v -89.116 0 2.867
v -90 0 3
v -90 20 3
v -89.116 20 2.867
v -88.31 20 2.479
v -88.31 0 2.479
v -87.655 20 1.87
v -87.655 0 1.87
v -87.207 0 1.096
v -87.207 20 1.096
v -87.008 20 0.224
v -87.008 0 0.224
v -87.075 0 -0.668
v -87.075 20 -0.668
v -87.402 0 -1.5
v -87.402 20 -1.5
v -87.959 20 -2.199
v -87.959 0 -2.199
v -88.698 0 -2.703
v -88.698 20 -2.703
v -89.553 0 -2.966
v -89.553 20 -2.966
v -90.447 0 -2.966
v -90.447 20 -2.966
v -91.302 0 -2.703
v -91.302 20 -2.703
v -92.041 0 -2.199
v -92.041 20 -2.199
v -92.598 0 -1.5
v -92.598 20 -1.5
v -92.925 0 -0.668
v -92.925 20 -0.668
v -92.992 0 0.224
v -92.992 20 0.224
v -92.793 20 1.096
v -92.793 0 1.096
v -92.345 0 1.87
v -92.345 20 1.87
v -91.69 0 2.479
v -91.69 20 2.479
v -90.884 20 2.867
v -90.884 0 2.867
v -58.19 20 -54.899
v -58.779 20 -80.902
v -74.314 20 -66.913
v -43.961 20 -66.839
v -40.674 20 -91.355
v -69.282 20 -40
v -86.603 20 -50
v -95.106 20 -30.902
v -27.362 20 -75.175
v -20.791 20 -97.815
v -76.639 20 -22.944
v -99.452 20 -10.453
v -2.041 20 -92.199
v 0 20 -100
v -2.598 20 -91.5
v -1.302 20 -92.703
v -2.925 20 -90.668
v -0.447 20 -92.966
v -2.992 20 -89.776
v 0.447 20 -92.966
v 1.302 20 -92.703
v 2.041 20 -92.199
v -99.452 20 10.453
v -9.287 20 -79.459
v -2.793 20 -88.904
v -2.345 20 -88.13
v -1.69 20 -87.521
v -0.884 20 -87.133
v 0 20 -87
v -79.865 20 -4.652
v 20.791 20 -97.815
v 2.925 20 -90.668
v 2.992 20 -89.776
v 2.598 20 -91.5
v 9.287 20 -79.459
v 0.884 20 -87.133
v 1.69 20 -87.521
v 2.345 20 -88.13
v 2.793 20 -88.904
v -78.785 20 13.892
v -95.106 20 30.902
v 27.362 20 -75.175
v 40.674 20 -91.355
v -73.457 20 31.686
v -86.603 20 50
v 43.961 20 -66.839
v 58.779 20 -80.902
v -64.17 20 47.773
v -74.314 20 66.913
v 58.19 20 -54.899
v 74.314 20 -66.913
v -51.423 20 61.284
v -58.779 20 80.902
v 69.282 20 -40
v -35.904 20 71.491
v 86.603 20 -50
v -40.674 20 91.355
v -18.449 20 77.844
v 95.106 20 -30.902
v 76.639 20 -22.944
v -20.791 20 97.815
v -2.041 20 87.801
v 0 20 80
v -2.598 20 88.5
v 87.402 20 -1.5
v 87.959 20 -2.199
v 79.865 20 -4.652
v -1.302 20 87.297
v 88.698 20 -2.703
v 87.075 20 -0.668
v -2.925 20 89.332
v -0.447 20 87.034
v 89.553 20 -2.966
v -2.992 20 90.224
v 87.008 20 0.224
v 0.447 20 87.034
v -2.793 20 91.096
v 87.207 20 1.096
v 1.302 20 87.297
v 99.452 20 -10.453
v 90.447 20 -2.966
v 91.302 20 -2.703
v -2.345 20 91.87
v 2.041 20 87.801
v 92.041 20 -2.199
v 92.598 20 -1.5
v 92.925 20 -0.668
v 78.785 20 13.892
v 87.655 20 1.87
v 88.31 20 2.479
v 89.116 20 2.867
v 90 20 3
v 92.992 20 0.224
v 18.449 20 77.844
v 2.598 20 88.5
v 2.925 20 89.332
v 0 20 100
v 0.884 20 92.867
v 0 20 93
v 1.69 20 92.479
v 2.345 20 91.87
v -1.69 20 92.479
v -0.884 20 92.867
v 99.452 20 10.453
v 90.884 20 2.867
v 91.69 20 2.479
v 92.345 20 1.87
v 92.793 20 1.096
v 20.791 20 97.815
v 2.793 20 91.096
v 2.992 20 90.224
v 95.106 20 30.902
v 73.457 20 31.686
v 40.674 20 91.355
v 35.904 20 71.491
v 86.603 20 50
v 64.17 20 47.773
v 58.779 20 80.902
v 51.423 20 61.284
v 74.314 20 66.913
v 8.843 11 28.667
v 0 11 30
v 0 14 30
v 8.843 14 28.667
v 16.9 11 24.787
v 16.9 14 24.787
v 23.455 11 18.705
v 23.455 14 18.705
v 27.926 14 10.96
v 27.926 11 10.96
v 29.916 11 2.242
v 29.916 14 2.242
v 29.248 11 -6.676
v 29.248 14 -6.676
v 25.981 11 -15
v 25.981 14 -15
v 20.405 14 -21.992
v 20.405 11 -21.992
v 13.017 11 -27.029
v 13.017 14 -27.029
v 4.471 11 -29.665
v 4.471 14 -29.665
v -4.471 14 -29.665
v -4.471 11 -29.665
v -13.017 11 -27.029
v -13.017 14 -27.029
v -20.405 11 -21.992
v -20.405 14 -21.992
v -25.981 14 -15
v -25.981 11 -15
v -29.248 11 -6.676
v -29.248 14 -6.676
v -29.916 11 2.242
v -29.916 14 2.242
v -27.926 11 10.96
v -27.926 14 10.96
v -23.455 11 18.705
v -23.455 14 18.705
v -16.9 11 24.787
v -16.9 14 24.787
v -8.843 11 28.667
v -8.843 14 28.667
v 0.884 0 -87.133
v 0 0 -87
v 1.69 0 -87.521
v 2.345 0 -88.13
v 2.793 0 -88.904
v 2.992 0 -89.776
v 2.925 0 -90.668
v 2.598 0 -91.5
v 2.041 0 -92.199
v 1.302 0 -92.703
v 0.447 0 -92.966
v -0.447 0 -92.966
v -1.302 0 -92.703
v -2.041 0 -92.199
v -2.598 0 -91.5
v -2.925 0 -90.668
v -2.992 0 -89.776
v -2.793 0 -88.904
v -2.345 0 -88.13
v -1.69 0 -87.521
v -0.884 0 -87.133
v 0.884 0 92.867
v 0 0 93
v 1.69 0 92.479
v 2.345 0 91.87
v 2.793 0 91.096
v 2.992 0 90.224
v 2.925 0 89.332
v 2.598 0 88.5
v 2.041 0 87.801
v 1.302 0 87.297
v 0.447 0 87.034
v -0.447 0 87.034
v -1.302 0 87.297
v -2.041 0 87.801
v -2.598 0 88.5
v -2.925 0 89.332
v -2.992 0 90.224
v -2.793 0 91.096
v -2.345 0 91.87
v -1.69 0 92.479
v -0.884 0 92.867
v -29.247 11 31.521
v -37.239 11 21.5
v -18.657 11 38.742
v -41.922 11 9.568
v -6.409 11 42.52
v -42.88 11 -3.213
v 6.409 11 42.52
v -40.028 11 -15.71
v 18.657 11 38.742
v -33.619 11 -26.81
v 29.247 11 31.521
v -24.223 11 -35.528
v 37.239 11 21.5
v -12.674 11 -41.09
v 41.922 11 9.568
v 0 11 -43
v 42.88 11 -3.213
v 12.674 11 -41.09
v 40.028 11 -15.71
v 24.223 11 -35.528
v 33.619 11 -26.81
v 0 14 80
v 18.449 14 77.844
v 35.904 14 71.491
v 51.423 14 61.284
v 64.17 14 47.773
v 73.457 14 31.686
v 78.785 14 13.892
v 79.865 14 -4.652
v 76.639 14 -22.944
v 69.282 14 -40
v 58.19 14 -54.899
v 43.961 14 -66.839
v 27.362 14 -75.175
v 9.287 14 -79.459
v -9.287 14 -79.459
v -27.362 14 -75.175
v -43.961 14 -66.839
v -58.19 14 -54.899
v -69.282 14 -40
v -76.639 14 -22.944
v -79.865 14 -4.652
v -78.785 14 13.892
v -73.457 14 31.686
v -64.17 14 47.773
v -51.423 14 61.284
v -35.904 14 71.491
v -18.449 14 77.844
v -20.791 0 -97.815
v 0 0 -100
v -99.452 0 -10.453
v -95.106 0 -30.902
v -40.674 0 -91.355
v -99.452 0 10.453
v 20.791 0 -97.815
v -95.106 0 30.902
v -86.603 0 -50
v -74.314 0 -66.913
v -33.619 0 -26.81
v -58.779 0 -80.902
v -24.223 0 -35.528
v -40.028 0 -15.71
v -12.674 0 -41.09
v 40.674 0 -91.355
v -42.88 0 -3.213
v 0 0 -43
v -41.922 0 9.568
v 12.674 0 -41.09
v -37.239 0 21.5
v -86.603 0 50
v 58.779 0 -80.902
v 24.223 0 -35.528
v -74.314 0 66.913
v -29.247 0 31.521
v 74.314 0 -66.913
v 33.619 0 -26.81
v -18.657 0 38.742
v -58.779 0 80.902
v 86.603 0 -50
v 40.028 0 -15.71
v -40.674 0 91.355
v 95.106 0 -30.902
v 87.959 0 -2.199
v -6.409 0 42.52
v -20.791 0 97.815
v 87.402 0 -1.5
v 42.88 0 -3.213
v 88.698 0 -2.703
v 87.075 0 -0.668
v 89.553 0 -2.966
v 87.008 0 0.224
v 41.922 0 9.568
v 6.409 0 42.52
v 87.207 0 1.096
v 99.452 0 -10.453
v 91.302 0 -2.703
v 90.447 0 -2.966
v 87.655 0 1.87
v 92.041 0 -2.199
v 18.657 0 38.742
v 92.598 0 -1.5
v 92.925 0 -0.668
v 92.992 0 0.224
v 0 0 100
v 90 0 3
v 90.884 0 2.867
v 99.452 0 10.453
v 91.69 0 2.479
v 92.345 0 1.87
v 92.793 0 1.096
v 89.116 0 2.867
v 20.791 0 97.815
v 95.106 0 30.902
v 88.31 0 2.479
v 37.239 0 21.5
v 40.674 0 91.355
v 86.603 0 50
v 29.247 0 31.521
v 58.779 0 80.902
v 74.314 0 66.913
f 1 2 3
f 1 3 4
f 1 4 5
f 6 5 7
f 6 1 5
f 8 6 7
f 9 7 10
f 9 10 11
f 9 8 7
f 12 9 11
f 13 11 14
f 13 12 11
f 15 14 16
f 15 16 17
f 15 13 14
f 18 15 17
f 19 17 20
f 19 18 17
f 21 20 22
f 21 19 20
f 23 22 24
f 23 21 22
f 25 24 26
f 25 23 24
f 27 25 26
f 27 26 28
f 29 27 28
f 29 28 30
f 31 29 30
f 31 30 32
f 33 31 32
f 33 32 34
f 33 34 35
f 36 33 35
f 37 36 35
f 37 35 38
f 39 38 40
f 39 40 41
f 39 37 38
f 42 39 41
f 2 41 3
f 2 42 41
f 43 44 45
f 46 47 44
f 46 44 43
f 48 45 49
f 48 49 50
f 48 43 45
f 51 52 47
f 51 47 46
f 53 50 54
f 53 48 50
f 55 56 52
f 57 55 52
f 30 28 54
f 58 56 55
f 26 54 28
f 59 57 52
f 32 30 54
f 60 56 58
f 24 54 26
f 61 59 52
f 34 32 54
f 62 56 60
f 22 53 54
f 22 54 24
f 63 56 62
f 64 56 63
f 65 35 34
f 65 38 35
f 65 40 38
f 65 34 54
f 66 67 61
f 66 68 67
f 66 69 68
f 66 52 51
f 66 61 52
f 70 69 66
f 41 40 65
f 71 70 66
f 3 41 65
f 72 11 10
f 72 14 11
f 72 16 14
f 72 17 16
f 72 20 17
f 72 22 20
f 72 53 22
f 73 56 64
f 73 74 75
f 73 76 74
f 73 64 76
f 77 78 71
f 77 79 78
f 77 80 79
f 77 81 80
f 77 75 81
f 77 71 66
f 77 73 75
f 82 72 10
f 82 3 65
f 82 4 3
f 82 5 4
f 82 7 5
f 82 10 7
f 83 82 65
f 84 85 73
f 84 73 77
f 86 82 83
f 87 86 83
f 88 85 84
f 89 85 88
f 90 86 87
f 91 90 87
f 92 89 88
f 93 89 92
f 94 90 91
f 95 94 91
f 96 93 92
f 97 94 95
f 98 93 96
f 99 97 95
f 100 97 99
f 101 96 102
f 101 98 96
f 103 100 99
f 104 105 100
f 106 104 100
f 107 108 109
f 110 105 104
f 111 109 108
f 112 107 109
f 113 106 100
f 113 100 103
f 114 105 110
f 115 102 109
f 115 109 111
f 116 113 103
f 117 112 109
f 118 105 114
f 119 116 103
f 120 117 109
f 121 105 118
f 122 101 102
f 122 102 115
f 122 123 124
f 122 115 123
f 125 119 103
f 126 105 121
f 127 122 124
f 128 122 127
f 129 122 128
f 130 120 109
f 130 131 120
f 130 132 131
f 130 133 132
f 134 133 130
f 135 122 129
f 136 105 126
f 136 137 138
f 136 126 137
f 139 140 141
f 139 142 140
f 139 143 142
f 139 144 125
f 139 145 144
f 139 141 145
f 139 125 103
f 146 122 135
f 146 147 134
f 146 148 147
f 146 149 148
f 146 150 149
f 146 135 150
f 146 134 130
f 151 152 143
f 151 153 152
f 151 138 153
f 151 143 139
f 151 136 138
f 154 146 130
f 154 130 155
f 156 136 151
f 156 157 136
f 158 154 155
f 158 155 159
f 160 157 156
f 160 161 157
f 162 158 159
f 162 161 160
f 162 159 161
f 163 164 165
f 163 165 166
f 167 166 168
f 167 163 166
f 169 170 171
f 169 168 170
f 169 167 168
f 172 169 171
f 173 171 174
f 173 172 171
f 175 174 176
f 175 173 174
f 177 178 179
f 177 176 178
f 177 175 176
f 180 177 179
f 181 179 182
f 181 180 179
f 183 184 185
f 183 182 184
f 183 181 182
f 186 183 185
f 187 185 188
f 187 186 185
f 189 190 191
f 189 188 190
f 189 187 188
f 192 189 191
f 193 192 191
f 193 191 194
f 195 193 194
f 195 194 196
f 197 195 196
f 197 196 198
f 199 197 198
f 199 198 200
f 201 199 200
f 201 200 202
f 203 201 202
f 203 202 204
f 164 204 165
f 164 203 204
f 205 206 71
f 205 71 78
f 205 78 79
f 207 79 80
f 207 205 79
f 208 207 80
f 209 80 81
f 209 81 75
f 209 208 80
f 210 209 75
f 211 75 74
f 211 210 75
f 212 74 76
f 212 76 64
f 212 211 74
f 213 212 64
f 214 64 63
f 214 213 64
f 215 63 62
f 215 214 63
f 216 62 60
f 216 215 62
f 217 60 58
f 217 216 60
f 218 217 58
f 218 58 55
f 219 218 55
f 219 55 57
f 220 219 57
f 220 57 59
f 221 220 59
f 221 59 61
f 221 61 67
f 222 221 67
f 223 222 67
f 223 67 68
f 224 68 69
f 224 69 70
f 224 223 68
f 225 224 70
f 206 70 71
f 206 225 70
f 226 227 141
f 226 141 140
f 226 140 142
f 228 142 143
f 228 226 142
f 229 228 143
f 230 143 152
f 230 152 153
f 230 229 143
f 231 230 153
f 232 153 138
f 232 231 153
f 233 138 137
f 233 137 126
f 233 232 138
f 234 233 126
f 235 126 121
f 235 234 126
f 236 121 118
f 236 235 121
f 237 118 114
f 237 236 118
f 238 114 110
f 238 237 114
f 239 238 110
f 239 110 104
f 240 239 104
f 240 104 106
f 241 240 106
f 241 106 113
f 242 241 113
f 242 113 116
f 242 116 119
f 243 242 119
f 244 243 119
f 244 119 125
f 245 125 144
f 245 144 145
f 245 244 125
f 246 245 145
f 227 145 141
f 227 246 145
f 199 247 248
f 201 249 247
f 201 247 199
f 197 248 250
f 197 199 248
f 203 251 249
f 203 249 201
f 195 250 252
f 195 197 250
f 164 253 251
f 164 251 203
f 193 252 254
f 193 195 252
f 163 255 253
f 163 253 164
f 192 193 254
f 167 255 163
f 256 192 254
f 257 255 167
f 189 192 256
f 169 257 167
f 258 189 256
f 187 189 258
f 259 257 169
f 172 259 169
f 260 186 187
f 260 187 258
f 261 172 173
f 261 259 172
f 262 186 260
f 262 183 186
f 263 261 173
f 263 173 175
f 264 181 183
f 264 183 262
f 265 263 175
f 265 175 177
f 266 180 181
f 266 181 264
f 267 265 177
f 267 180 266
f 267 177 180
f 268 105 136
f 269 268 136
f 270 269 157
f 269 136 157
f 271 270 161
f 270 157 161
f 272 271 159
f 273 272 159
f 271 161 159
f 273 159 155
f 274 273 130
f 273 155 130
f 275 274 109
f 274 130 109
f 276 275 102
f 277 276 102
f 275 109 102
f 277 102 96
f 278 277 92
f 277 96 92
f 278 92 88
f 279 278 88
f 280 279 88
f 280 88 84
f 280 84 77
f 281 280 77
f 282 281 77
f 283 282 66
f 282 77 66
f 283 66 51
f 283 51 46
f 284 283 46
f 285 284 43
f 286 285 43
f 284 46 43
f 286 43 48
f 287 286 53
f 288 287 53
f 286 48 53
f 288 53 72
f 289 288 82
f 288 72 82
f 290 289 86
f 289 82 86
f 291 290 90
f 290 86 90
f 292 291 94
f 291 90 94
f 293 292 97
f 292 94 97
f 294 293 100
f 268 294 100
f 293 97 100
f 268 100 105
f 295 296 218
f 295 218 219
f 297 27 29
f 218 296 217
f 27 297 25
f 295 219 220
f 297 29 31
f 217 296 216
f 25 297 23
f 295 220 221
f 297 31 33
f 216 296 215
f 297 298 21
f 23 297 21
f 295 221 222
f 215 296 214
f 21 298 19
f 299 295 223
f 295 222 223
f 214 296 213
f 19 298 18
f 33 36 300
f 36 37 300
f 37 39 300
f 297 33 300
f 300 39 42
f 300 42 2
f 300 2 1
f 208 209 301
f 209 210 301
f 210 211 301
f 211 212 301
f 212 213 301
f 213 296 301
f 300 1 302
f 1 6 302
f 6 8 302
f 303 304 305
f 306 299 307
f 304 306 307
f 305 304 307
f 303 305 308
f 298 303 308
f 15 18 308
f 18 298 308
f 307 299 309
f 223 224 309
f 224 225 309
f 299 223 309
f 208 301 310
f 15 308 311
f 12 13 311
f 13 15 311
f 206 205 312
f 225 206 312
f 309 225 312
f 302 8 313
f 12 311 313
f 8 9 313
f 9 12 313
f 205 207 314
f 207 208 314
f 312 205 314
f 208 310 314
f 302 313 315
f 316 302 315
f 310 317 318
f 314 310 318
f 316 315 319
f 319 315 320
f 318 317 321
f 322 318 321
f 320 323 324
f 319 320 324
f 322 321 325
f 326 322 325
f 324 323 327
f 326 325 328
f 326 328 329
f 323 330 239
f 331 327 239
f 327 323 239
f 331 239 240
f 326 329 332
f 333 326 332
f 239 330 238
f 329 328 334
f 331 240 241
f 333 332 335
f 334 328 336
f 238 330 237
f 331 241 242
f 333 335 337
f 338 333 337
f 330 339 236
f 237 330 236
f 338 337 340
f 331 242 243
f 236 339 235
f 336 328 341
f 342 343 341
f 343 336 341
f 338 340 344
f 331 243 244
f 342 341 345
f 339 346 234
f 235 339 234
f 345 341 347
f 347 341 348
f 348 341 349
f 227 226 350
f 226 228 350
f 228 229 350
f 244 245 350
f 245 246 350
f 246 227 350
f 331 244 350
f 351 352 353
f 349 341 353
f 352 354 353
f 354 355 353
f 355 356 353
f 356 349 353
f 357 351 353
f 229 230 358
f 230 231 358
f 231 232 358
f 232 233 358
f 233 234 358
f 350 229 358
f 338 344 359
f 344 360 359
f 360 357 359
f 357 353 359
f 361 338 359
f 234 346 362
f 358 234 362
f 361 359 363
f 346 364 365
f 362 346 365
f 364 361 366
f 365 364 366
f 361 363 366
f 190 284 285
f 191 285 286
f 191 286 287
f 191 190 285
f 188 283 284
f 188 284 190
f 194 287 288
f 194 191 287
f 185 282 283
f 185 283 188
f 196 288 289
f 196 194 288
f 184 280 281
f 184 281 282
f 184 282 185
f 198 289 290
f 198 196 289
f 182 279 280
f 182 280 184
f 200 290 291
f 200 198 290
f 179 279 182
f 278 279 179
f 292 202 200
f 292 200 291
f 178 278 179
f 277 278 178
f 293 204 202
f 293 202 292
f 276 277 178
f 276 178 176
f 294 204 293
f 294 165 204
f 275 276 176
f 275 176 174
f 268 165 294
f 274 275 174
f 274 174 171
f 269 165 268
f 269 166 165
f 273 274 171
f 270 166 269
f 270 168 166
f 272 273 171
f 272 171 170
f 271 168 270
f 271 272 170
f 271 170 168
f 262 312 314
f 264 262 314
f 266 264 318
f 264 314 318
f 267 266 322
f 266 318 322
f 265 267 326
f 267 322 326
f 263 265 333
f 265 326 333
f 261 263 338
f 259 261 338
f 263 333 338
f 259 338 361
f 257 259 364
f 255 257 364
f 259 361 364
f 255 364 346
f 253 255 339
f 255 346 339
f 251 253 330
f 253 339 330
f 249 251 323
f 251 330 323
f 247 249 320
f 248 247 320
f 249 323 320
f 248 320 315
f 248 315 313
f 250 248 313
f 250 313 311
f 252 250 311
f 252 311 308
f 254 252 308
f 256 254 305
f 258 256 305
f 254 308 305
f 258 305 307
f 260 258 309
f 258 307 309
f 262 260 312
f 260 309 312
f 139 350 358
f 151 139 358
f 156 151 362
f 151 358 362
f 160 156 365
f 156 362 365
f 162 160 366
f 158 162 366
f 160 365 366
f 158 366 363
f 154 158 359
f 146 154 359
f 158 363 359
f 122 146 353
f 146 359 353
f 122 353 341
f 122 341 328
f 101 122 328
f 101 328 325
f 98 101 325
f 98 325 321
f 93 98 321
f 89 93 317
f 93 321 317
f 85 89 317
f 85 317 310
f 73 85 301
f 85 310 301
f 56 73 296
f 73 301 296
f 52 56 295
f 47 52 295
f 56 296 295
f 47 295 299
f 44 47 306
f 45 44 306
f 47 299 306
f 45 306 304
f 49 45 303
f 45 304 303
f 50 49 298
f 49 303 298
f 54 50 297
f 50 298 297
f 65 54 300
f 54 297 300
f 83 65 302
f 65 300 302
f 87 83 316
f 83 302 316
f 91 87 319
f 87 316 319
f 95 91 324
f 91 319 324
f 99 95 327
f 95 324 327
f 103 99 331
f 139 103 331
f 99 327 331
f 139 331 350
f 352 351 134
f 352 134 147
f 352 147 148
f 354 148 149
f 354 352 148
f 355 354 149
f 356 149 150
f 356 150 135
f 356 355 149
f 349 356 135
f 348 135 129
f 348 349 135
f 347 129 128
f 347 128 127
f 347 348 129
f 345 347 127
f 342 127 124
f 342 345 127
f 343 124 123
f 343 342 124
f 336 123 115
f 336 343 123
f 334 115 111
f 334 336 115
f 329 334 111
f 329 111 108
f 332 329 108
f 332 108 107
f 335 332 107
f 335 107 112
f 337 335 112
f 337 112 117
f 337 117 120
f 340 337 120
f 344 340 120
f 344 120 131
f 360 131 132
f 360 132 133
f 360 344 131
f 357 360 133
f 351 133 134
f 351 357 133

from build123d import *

# Parameters (mm, degrees)
SKETCH_2_R          = 100
SKETCH_2_R_2        = 3
SKETCH_2_R_3        = 30
EXTRUDE_1_DEPTH     = 20
SKETCH_3_R          = 43
CUT_EXTRUDE_1_DEPTH = 11
SKETCH_4_R          = 80
CUT_EXTRUDE_2_DEPTH = 6


with BuildPart() as part:
    # 草图2 → 凸台-拉伸1 (new body)
    with BuildSketch(Plane(origin=(0, 0, 0), x_dir=(1, 0, 0), z_dir=(0, 1, 0))):
        with Locations(Location((0, 0, 0), (0, 0, 270))):
            Circle(SKETCH_2_R)
        with Locations(Location((0, 90, 0), (0, 0, 270))):
            Circle(SKETCH_2_R_2, mode=Mode.SUBTRACT)
        with Locations(Location((90, 0, 0), (0, 0, 270))):
            Circle(SKETCH_2_R_2, mode=Mode.SUBTRACT)
        with Locations(Location((0, -90, 0), (0, 0, 270))):
            Circle(SKETCH_2_R_2, mode=Mode.SUBTRACT)
        with Locations(Location((-90, 0, 0), (0, 0, 270))):
            Circle(SKETCH_2_R_2, mode=Mode.SUBTRACT)
        with Locations(Location((0, 0, 0), (0, 0, 270))):
            Circle(SKETCH_2_R_3, mode=Mode.SUBTRACT)
    extrude(amount=EXTRUDE_1_DEPTH)

    # 草图3 → 切除-拉伸1 (cut)
    with BuildSketch(Plane.XZ):
        with Locations(Location((0, 0, 0), (0, 0, 270))):
            Circle(SKETCH_3_R)
    extrude(amount=-CUT_EXTRUDE_1_DEPTH, mode=Mode.SUBTRACT)

    # 草图4 → 切除-拉伸2 (cut)
    with BuildSketch(Plane(origin=(0, 20, 0), x_dir=(1, 0, 0), z_dir=(0, 1, 0))):
        with Locations(Location((0, 0, 0), (0, 0, 270))):
            Circle(SKETCH_4_R)
    extrude(amount=-CUT_EXTRUDE_2_DEPTH, mode=Mode.SUBTRACT)


solid = part.part
